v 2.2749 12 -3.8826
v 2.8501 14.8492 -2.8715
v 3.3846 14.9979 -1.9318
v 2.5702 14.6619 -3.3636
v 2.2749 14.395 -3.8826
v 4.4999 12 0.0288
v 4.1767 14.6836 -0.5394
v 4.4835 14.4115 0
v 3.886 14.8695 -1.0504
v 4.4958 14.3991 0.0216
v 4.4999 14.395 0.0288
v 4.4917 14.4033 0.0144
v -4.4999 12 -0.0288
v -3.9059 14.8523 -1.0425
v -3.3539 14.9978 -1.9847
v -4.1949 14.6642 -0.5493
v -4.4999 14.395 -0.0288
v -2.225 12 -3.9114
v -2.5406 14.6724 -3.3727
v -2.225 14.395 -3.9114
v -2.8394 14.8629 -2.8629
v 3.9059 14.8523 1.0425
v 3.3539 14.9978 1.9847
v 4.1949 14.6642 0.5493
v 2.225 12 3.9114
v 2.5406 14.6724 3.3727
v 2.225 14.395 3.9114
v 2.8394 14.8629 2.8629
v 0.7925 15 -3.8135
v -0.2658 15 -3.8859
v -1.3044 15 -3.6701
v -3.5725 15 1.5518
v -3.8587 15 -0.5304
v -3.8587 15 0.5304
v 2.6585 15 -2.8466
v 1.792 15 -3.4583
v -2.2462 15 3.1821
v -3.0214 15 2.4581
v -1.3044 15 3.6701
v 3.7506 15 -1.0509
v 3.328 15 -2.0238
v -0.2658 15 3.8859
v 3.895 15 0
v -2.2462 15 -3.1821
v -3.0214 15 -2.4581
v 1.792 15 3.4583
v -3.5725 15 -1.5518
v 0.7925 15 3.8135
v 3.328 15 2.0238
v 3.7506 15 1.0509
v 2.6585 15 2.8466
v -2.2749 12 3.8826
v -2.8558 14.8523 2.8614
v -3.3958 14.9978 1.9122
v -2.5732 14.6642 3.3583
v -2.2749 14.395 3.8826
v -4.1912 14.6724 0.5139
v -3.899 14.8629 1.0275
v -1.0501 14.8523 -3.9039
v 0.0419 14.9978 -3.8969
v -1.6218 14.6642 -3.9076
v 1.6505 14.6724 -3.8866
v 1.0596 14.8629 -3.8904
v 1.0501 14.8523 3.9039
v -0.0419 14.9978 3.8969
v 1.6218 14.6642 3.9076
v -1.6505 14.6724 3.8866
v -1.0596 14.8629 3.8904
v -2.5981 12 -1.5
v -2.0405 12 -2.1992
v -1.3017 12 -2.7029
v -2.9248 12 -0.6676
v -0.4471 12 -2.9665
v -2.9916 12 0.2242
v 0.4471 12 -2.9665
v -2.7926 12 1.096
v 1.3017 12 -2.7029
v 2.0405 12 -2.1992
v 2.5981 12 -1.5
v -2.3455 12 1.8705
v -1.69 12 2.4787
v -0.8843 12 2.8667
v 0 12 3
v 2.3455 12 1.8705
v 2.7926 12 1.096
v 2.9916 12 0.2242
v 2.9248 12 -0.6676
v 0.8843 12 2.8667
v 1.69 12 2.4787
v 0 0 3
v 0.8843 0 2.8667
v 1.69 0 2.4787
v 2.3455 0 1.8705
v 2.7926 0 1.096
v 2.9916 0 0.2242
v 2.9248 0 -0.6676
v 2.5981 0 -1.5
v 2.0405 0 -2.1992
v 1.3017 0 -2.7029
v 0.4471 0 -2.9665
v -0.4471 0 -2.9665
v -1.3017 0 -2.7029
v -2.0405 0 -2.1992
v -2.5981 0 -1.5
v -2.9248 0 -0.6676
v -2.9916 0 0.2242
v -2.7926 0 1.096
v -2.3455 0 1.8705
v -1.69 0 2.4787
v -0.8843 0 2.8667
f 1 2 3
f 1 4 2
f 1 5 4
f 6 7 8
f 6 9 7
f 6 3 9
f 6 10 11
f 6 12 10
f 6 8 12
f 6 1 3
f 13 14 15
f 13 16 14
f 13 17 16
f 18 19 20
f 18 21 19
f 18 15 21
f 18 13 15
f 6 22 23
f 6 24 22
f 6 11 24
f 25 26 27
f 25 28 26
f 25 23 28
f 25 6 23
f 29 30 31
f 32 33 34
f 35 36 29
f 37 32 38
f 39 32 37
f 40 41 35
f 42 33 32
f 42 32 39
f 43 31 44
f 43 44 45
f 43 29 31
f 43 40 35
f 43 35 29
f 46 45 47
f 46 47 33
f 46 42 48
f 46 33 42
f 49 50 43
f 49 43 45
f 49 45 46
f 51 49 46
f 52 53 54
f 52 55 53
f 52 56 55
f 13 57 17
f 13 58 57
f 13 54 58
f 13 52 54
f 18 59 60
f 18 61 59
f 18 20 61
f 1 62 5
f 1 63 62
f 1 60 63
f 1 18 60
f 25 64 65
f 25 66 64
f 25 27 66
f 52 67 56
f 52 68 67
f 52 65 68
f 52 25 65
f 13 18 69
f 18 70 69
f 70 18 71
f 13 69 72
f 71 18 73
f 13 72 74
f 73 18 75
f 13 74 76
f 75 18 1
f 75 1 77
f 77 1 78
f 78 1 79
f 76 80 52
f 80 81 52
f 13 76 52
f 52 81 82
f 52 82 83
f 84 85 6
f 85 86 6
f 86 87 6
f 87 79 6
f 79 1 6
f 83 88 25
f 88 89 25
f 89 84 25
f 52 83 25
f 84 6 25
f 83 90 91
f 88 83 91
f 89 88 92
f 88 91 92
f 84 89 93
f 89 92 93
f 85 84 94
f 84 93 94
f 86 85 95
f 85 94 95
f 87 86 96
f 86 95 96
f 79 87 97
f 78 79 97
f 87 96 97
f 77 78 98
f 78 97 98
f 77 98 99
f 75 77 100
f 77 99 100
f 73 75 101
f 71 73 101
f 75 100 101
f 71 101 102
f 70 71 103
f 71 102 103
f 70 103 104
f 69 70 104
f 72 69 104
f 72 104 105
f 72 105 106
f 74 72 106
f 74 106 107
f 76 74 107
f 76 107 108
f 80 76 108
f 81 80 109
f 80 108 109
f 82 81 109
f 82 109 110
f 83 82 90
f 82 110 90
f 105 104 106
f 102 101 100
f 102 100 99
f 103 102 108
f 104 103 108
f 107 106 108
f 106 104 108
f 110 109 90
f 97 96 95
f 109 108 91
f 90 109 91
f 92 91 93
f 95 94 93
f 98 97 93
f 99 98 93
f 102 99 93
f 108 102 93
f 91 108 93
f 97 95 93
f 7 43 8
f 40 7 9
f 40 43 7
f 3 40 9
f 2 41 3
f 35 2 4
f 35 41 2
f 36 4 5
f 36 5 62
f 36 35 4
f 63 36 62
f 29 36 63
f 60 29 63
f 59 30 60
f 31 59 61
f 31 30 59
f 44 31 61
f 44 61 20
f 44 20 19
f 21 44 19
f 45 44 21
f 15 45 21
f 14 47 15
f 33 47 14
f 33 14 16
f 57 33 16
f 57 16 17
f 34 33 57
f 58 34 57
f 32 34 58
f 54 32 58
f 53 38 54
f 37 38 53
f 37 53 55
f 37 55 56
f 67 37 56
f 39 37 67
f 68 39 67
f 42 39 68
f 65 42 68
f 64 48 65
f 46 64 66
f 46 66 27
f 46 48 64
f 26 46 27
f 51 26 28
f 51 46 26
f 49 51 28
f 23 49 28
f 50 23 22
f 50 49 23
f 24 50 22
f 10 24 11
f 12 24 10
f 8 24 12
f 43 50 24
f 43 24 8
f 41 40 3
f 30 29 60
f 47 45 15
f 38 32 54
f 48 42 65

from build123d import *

# Parameters (mm, degrees)
SKETCH1_R           = 3
BOSS_EXTRUDE1_DEPTH = 12
SKETCH2_R           = 4.5
BOSS_EXTRUDE2_DEPTH = 3
CUT_EXTRUDE3_START  = -3
CUT_EXTRUDE3_DEPTH  = 3
SKETCH4_OUTSIDE_W   = 49.116
SKETCH4_OUTSIDE_H   = 47.938
SKETCH4_OUTSIDE_R   = 3.895
CUT_EXTRUDE4_DEPTH  = 17.141517221
CUT_EXTRUDE4_DRAFT  = -45


with BuildPart() as part:
    # Sketch1 → Boss-Extrude1 (new body)
    with BuildSketch(Plane(origin=(0, 0, 0), x_dir=(1, 0, 0), z_dir=(0, 1, 0))):
        Circle(SKETCH1_R)
    extrude(amount=BOSS_EXTRUDE1_DEPTH)

    # Sketch2 → Boss-Extrude2 (add)
    with BuildSketch(Plane(origin=(0, 12, 0), x_dir=(1, 0, 0), z_dir=(0, 1, 0))):
        Circle(SKETCH2_R)
    extrude(amount=BOSS_EXTRUDE2_DEPTH)

    # Sketch3 → Cut-Extrude3 (cut)
    with BuildSketch(Plane(origin=(0, 15, 0), x_dir=(1, 0, 0), z_dir=(0, 1, 0)).offset(CUT_EXTRUDE3_START)):
        with BuildLine():
            ThreePointArc((-2.274915326, -3.882622858), (-0.028823035, -4.499907692), (2.224992365, -3.911445893))
            Line((2.224992365, -3.911445893), (-2.274915326, -3.882622858))
        make_face()
        with BuildLine():
            Line((4.499907692, -0.028823035), (2.224992365, -3.911445893))
            ThreePointArc((2.224992365, -3.911445893), (3.882622858, -2.274915326), (4.499907692, -0.028823035))
        make_face()
        with BuildLine():
            Line((2.274915326, 3.882622858), (4.499907692, -0.028823035))
            ThreePointArc((4.499907692, -0.028823035), (3.911445893, 2.224992365), (2.274915326, 3.882622858))
        make_face()
        with BuildLine():
            ThreePointArc((-4.499907692, 0.028823035), (-3.911445893, -2.224992365), (-2.274915326, -3.882622858))
            Line((-2.274915326, -3.882622858), (-4.499907692, 0.028823035))
        make_face()
        with BuildLine():
            Line((-2.224992365, 3.911445893), (2.274915326, 3.882622858))
            ThreePointArc((2.274915326, 3.882622858), (0.028823035, 4.499907692), (-2.224992365, 3.911445893))
        make_face()
        with BuildLine():
            ThreePointArc((-2.224992365, 3.911445893), (-3.882622858, 2.274915326), (-4.499907692, 0.028823035))
            Line((-4.499907692, 0.028823035), (-2.224992365, 3.911445893))
        make_face()
    extrude(amount=CUT_EXTRUDE3_DEPTH, mode=Mode.SUBTRACT)


with BuildPart() as cut_extrude4_tool:
    # Sketch4 outside → Cut-Extrude4 (with draft: the straight prism first)
    with BuildSketch(Plane(origin=(0, 15, 0), x_dir=(1, 0, 0), z_dir=(0, 1, 0))):
        Rectangle(SKETCH4_OUTSIDE_W, SKETCH4_OUTSIDE_H)
        Circle(SKETCH4_OUTSIDE_R, mode=Mode.SUBTRACT)
    extrude(amount=-CUT_EXTRUDE4_DEPTH)
    # Cut-Extrude4: the draft: its side faces are tilted about the plane it starts from
    cut_extrude4_sides = [cut_extrude4_tool.faces().sort_by_distance(p)[0] for p in [
        (0, 6.429241389, 23.969),
        (24.558, 6.429241389, 0),
        (0, 6.429241389, -23.969),
        (-24.558, 6.429241389, 0),
        (-3.895, 6.429241389, 0),
    ]]
    draft(cut_extrude4_sides, Plane(origin=(0, 15, 0), x_dir=(1, 0, 0), z_dir=(0, 1, 0)), CUT_EXTRUDE4_DRAFT)


with BuildPart() as part_1:
    add(part.part)

    # Cut-Extrude4: cut by cut_extrude4_tool
    add(cut_extrude4_tool.part, mode=Mode.SUBTRACT)


solid = part_1.part
